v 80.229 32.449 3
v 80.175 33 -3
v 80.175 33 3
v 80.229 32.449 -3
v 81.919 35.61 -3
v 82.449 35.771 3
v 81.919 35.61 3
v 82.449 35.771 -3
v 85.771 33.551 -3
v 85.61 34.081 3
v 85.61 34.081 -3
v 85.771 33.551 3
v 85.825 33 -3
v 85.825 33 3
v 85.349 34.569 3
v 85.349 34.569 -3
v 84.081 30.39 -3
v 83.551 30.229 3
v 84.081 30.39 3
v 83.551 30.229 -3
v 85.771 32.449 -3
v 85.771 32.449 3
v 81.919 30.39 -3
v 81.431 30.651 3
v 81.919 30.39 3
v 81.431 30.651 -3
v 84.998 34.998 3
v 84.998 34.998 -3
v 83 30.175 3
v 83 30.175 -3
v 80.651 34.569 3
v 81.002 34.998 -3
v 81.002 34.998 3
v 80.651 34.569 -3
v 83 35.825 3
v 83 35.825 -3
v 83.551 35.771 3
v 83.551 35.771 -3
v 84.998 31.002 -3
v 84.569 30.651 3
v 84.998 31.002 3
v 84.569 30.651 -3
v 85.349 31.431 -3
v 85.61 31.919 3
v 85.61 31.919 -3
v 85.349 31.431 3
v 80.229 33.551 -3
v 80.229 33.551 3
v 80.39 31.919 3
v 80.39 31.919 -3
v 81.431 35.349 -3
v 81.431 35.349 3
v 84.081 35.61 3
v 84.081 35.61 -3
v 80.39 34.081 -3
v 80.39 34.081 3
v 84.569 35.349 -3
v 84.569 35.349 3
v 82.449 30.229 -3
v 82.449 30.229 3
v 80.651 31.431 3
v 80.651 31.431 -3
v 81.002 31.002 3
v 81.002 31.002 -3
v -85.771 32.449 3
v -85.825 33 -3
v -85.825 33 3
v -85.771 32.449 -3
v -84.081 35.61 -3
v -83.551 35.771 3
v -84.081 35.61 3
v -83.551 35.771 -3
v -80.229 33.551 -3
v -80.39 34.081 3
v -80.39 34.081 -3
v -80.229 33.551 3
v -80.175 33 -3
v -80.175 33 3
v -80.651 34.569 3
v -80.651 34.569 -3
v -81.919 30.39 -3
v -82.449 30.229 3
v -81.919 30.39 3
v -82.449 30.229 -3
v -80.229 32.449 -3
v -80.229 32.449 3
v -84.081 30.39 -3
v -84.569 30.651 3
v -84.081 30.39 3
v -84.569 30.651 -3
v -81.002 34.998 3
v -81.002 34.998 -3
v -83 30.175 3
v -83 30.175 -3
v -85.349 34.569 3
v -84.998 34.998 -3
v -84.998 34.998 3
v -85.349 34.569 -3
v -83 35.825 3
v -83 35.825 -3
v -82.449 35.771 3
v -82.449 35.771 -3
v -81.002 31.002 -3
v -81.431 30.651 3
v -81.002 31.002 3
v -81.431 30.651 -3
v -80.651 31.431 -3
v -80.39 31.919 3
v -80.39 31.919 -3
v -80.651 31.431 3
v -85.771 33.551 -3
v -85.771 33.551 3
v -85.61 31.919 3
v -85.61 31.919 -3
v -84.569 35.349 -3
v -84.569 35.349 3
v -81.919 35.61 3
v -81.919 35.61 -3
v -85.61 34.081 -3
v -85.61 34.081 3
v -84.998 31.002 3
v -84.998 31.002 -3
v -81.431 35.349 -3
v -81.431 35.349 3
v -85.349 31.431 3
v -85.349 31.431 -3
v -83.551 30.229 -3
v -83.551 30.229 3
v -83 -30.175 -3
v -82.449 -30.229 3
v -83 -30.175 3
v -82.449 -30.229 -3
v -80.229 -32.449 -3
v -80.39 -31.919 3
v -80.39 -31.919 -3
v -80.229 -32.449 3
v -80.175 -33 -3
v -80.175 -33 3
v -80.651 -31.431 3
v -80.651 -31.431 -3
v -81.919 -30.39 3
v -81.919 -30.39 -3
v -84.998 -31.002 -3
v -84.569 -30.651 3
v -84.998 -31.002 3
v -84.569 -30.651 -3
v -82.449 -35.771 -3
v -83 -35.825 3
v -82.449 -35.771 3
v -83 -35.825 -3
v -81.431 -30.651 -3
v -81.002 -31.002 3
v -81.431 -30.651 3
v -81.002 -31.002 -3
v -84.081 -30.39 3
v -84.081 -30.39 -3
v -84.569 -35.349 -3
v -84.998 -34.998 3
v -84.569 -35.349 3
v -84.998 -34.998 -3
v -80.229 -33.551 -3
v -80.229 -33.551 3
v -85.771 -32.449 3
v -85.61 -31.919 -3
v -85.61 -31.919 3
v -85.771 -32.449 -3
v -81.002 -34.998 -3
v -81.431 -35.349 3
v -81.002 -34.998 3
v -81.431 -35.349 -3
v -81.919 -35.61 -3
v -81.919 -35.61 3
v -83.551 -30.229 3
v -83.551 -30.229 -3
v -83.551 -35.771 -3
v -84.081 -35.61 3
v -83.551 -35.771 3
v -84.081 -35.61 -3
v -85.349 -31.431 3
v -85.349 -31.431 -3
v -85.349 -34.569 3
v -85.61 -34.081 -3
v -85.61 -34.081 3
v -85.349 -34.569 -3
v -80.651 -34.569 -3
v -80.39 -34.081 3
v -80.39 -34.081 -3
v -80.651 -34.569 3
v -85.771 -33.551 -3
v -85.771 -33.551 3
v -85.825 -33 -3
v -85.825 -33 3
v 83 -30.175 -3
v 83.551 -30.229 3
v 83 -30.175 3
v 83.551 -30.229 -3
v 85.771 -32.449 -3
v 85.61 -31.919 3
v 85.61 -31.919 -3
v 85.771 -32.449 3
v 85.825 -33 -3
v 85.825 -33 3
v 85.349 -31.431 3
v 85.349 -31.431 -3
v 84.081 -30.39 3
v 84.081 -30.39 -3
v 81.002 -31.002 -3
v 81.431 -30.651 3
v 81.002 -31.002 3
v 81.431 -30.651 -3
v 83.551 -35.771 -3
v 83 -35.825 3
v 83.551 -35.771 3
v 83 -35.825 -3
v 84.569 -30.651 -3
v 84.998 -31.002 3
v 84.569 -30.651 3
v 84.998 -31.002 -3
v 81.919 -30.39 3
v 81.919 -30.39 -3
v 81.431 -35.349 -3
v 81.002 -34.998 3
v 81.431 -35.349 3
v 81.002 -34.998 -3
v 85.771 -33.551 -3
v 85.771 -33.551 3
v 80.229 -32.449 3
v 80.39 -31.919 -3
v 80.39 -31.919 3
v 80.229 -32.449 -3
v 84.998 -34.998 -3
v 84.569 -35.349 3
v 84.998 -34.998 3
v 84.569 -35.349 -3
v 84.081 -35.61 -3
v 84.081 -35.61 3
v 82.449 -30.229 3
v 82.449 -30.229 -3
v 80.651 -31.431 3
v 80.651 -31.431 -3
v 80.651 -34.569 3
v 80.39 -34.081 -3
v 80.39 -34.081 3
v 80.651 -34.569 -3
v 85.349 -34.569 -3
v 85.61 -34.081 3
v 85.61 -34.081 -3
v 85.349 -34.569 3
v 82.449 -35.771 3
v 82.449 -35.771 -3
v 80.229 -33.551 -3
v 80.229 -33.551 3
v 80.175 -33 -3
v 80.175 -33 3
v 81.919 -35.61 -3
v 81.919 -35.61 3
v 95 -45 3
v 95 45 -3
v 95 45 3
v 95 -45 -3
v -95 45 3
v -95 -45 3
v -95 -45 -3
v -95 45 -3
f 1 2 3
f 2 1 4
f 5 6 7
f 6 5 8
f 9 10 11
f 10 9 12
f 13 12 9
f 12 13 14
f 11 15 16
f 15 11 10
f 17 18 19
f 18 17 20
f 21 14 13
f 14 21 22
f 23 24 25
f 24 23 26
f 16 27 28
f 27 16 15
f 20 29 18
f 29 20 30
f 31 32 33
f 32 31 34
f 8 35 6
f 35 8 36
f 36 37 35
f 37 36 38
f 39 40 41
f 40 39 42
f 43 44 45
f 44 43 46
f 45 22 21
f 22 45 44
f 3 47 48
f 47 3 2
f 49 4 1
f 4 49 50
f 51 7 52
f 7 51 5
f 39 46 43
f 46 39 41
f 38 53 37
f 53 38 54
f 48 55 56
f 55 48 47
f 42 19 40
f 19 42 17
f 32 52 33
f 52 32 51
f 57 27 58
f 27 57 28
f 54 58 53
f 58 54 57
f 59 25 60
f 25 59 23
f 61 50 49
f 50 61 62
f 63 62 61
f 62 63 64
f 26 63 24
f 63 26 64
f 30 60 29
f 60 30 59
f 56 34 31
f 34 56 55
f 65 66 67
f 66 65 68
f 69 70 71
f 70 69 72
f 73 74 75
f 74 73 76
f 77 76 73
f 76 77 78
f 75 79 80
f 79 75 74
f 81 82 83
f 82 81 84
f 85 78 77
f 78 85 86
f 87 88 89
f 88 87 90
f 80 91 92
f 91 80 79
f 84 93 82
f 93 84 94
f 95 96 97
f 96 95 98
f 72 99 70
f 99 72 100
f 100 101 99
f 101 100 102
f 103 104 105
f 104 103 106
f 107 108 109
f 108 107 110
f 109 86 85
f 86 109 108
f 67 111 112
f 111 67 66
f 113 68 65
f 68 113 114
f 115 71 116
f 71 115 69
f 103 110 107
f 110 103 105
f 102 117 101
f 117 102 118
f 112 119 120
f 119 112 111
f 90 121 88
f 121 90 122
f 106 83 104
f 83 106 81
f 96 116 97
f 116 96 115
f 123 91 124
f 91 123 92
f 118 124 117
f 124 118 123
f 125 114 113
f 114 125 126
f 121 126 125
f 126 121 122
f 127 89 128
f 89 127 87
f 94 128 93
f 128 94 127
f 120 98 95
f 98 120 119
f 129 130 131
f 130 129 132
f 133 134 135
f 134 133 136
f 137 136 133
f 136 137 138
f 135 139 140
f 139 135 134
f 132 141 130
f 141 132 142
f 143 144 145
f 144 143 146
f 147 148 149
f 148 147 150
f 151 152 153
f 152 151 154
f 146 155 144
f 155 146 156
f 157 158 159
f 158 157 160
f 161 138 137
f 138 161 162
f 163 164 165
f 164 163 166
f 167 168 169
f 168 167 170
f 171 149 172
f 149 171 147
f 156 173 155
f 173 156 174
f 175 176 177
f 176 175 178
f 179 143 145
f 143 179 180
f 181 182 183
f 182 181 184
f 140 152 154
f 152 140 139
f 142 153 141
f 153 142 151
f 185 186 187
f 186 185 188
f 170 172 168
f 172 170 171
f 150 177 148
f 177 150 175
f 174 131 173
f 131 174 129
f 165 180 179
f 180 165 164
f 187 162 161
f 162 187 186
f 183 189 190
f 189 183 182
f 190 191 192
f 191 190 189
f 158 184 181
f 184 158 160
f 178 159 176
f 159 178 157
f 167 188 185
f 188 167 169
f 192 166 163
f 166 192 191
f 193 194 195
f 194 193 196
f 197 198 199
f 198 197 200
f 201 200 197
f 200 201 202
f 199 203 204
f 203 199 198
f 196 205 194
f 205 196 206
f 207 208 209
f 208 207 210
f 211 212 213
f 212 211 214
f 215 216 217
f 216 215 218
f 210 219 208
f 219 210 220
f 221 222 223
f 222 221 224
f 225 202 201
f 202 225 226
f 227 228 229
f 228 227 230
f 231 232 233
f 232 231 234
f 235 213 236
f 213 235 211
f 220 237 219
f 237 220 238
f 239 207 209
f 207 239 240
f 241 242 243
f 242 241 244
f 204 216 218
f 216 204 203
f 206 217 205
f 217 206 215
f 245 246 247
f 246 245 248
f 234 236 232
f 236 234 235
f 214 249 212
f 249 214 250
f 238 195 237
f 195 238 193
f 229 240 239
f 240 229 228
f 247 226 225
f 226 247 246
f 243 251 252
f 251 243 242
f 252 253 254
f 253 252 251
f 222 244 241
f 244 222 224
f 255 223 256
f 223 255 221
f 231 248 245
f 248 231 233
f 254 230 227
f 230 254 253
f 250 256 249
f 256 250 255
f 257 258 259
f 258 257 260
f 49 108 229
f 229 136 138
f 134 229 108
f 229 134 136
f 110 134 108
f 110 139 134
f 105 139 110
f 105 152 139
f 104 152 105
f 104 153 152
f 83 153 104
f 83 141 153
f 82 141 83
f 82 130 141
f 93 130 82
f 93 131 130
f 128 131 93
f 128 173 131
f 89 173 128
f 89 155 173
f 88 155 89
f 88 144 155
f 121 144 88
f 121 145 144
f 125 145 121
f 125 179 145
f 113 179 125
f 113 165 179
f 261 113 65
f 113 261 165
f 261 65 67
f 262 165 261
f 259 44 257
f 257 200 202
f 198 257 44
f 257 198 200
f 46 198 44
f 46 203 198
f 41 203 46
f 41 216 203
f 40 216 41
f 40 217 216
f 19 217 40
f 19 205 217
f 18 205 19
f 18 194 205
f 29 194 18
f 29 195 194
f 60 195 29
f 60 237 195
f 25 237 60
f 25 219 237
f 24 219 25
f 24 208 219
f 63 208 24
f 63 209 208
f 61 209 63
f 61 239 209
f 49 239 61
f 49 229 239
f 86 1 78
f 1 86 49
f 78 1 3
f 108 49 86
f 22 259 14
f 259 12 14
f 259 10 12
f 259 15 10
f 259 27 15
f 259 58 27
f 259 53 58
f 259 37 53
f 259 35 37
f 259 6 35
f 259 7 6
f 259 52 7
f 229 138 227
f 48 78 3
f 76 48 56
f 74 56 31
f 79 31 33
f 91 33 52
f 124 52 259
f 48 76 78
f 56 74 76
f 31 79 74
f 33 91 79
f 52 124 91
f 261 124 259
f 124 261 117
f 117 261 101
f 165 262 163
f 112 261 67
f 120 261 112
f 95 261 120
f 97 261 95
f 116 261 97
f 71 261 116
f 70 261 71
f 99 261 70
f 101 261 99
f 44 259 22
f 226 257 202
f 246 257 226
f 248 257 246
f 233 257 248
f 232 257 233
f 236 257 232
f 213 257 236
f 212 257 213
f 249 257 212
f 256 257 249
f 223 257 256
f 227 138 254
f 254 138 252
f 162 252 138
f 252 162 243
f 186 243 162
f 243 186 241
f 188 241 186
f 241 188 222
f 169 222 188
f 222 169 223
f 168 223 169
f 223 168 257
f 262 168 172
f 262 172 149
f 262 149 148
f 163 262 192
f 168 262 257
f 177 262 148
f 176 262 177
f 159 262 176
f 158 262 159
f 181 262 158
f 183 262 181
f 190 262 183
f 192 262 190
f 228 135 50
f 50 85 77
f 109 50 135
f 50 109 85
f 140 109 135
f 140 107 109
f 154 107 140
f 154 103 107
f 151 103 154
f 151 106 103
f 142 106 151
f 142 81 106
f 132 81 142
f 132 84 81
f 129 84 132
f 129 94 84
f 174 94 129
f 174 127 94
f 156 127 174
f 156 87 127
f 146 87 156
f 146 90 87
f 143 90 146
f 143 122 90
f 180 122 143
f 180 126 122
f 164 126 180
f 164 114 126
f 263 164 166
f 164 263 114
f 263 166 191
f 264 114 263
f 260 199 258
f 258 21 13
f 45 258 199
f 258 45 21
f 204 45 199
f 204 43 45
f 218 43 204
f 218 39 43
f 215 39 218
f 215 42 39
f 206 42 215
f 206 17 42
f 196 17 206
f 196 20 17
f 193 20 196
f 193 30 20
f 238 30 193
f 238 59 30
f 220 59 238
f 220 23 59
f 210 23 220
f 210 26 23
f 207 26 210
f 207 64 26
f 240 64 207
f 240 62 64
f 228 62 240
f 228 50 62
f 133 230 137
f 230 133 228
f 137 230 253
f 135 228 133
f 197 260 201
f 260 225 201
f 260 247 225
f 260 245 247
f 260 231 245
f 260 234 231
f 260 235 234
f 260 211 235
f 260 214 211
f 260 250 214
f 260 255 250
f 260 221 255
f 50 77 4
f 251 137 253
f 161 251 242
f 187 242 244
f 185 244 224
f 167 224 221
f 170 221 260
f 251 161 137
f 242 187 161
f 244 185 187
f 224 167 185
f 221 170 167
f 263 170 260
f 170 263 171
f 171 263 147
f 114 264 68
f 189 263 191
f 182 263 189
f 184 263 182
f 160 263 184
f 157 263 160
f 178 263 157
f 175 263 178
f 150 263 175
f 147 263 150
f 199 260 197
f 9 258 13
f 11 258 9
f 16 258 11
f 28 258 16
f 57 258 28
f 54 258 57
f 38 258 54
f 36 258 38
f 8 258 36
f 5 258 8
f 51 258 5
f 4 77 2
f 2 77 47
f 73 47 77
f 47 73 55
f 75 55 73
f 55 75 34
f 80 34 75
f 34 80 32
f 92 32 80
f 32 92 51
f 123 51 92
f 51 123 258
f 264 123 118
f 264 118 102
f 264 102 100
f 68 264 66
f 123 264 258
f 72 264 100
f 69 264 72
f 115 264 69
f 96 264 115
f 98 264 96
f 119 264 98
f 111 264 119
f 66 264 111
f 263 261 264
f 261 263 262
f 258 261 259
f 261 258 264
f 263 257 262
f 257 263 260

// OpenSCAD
$fn = 32;

// ----------------------------------------------------------------------
// Corner plate 190 x 90 x 6
// 4 holes, centres taken from the edge offset
// ----------------------------------------------------------------------

// --- parameters (mm) ---
plate = [190, 90, 6];    // overall size (x, y, z)
holes = 4;               // number of holes the drawing asks for
bore_d = 5.5;            // nominal hole diameter from the drawing
print_allowance = 0.15;  // clearance added for printing
edge = 12;               // hole centre offset from the plate edge

// --- derived feature positions (mm) ---
hole_d = bore_d + print_allowance;  // = 5.65   hole diameter as printed
corner_x = plate[0] / 2 - edge;     // = 83   corner hole X
corner_y = plate[1] / 2 - edge;     // = 33   corner hole Y
feature_centers = [
  [corner_x, corner_y],
  [-corner_x, corner_y],
  [-corner_x, -corner_y],
  [corner_x, -corner_y]
];   // hole centres the loop below drills

// plate outline, every hole drilled through with the same cutters
difference() {
  cube(plate, center = true);
  for (centre = feature_centers)
    translate([centre[0], centre[1], 0])
      cylinder(d = hole_d, h = plate[2] + 2, center = true);
}
